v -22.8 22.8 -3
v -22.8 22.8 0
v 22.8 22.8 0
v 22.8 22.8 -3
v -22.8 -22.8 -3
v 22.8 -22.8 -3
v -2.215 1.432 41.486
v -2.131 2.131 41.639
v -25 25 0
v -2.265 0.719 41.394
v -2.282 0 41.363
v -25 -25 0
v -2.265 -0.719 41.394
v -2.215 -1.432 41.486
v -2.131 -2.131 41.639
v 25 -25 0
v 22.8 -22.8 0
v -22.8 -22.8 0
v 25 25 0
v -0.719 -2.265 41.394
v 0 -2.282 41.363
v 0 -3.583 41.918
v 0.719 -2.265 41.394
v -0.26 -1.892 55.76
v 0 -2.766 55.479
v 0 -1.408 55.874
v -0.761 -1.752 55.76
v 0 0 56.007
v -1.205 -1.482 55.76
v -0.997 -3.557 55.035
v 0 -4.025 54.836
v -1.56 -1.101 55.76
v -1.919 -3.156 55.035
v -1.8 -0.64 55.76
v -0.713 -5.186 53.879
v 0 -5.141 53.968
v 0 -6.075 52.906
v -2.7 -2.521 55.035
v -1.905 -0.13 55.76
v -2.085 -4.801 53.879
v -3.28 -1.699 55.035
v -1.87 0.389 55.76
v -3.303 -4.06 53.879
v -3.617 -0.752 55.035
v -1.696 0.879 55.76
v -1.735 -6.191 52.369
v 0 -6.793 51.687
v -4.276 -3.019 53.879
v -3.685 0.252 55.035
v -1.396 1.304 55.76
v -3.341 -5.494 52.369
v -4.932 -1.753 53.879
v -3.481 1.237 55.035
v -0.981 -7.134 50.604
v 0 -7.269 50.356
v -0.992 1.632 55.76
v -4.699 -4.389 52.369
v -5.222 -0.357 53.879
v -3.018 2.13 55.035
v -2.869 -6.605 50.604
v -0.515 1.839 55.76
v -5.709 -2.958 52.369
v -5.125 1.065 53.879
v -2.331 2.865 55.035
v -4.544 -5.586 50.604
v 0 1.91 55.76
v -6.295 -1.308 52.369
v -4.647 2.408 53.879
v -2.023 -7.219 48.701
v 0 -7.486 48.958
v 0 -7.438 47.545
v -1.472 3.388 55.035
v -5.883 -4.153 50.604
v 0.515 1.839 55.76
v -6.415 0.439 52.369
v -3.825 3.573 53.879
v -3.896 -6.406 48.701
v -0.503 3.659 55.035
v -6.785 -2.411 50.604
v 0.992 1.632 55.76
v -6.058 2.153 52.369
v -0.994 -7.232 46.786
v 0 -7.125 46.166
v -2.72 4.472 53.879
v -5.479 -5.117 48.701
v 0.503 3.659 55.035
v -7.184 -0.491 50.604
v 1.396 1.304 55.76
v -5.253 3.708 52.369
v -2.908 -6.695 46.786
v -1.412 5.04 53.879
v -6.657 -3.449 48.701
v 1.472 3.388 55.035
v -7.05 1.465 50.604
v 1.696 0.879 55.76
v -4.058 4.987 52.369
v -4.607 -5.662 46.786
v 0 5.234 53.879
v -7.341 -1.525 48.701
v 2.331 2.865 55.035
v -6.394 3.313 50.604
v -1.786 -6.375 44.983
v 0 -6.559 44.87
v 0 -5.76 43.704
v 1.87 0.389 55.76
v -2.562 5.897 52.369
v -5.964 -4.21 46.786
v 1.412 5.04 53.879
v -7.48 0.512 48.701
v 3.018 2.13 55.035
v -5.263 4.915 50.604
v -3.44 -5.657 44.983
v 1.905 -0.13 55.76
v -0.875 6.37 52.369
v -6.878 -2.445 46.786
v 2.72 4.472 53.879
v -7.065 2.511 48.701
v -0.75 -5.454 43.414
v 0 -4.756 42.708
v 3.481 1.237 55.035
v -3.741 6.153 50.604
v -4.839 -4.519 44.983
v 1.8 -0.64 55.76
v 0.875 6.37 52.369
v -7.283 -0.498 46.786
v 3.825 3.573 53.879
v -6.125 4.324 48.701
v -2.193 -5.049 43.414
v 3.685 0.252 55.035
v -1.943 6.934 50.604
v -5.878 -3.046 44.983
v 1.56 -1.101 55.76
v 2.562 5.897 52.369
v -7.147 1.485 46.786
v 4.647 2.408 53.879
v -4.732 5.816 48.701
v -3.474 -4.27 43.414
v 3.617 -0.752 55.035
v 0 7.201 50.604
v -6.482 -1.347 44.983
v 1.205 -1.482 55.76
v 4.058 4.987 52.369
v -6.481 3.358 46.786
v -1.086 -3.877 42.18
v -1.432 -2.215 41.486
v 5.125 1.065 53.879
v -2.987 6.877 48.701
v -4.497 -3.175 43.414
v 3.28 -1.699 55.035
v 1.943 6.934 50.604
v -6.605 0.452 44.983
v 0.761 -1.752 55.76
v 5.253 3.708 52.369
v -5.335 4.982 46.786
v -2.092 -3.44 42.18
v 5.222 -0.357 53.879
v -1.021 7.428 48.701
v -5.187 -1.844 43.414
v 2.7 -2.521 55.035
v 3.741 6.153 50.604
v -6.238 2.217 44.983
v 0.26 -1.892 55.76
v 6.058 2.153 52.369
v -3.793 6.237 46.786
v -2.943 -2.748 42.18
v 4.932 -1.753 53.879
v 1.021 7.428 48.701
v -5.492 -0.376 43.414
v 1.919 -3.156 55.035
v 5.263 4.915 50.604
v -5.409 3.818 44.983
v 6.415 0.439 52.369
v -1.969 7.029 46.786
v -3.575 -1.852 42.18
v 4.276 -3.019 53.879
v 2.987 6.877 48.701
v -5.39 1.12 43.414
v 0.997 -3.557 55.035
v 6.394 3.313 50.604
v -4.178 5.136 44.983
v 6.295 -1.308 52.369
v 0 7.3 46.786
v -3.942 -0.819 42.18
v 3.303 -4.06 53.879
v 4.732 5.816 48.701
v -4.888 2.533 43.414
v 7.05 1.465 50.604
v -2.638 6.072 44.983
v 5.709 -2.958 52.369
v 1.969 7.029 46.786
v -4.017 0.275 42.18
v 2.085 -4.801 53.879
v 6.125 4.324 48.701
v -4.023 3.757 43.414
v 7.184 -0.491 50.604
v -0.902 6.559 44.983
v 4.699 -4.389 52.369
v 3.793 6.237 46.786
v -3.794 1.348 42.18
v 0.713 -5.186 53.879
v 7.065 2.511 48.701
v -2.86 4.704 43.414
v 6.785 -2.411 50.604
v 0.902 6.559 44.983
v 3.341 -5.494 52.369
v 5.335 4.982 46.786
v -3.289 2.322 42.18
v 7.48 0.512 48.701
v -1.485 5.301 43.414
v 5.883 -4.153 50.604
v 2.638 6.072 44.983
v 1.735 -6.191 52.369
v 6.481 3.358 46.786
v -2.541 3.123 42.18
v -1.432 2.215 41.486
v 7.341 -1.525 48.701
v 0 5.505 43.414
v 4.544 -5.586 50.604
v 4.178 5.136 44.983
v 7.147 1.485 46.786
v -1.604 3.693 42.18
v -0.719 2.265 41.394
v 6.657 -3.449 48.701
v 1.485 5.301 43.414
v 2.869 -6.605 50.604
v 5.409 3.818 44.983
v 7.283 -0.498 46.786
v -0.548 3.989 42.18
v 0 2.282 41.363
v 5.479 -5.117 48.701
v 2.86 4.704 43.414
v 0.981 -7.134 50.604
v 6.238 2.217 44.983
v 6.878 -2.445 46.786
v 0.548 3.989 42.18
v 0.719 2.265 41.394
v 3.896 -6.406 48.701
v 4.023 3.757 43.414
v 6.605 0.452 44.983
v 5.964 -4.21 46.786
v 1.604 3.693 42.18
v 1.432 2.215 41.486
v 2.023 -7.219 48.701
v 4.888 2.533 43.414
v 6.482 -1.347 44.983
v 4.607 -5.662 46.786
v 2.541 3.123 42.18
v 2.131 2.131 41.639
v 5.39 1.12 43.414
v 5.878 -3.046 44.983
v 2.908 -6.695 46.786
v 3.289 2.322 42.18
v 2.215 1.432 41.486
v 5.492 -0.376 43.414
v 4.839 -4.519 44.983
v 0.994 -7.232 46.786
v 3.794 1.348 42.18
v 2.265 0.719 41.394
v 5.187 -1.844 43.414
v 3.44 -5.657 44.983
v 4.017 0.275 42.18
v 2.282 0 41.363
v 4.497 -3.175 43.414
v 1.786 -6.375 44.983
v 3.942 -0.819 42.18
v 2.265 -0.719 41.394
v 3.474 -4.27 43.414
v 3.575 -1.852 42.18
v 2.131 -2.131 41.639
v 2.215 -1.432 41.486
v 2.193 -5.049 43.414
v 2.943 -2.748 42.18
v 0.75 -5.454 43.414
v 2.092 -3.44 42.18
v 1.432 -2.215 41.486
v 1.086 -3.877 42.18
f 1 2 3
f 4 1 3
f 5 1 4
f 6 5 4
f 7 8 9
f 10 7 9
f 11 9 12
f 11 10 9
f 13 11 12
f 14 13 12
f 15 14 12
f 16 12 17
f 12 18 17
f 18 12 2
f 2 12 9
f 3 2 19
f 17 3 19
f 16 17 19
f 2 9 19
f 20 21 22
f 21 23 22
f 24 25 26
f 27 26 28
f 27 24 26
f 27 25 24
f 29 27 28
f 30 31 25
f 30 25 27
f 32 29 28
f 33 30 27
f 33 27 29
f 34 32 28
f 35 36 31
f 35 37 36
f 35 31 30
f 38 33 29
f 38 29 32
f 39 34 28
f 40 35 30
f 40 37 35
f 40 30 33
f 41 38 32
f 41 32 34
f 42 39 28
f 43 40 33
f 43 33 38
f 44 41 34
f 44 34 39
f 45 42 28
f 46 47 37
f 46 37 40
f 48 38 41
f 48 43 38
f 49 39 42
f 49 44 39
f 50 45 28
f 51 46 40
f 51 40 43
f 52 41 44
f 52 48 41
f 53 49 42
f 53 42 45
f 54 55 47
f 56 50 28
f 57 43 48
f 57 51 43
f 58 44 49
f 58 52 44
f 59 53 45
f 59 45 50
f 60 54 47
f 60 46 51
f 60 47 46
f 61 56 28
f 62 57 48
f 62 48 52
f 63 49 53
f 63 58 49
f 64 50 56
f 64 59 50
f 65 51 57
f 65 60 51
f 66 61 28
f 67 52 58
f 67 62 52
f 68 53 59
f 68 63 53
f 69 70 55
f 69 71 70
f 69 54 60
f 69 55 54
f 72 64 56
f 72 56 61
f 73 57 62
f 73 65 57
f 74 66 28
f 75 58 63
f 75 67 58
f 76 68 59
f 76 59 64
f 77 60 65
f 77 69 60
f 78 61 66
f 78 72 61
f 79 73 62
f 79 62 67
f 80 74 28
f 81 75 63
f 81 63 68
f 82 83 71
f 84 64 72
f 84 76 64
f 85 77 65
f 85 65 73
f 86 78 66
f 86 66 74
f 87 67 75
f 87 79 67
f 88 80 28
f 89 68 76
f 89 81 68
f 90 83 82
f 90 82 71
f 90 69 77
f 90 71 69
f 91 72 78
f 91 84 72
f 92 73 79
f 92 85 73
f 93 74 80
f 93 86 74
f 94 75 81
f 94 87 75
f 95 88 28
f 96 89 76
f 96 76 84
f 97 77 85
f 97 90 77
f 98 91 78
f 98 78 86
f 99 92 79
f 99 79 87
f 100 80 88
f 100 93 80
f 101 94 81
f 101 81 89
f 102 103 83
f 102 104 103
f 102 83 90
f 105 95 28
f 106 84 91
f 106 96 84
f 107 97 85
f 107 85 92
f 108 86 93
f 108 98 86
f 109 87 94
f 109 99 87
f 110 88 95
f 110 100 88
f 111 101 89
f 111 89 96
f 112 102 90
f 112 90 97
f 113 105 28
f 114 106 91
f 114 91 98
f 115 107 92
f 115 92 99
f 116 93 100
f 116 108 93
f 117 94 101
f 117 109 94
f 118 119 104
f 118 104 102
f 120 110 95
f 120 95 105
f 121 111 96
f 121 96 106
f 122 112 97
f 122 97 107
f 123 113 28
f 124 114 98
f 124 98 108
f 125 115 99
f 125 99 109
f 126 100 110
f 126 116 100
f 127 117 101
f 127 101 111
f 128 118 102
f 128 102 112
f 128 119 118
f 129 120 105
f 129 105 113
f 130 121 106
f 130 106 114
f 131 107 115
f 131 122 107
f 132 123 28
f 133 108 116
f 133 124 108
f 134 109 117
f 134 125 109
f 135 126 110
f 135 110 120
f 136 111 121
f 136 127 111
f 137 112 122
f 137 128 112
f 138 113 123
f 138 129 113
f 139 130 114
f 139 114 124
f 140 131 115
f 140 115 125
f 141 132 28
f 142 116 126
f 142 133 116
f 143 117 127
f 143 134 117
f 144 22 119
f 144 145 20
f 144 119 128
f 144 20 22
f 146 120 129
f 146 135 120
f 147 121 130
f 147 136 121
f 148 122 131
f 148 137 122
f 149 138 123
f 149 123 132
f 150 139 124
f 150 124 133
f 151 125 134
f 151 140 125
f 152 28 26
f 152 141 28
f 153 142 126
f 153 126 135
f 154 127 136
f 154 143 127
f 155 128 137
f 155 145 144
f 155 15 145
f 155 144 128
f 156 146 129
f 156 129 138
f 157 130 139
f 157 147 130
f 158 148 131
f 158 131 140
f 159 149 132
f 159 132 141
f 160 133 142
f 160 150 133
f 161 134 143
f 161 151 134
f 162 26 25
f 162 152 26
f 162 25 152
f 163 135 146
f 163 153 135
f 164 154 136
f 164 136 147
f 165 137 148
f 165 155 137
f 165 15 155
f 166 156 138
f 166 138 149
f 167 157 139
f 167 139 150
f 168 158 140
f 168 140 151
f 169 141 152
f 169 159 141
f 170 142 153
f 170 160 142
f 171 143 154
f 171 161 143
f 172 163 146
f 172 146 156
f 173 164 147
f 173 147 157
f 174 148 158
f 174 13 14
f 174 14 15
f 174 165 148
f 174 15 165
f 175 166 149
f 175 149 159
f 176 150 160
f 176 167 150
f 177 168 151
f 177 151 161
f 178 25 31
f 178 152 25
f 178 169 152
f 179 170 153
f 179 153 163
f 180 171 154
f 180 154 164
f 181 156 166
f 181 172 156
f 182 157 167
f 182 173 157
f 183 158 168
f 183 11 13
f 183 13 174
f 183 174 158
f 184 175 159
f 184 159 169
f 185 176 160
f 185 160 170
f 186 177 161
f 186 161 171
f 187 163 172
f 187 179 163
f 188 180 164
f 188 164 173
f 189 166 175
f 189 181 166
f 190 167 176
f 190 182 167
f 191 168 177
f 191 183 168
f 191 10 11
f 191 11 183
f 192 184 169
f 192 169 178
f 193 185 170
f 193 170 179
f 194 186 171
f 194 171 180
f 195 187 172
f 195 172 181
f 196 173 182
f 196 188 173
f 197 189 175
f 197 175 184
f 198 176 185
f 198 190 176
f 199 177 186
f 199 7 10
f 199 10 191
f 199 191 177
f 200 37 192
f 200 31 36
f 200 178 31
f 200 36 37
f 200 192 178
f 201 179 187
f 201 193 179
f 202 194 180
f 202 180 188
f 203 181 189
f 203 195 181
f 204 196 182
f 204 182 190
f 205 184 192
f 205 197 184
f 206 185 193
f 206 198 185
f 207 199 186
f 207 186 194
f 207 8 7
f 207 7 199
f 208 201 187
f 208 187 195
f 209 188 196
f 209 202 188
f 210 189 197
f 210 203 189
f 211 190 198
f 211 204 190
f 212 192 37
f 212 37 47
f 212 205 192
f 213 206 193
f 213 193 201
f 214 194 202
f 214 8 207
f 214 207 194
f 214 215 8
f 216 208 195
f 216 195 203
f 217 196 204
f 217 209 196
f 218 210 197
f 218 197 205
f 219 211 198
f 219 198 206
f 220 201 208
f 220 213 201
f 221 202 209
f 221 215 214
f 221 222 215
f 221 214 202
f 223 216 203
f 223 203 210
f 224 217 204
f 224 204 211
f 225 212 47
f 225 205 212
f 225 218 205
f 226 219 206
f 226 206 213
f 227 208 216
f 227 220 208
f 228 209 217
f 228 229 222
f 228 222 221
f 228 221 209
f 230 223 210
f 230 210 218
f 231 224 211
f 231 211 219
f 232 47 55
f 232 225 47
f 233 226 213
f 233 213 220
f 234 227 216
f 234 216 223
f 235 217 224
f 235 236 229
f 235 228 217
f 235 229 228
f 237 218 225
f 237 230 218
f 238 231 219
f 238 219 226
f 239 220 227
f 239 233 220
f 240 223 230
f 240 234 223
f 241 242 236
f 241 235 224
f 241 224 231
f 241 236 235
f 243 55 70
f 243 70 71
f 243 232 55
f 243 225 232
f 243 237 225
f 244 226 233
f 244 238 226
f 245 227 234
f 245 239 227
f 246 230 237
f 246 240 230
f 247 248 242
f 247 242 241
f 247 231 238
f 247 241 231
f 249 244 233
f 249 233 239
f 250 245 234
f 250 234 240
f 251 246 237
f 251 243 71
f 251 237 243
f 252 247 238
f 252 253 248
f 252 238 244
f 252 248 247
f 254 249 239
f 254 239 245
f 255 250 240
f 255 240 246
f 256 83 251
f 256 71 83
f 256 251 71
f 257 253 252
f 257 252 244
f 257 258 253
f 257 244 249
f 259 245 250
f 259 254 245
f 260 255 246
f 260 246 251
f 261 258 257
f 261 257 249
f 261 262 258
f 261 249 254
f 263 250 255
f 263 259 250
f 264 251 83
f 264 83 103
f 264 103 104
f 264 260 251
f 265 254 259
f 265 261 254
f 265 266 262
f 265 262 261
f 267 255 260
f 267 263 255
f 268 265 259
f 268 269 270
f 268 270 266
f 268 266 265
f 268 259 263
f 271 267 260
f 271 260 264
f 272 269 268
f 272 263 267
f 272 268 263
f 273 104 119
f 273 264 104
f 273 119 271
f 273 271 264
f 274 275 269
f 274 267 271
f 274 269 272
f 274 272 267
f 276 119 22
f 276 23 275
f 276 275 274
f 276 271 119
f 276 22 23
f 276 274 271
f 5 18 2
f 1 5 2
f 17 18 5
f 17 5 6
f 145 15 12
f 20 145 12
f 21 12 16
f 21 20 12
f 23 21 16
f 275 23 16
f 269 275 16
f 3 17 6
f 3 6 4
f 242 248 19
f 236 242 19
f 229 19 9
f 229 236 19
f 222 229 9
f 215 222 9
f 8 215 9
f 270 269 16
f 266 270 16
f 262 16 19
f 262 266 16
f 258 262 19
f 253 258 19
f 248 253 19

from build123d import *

# Parameters (mm, degrees)
F0_W     = 50
F0_H     = 50
F5_W     = 45.6
F5_H     = 45.6
F6_DEPTH = 3


with BuildPart() as f2:
    # F0 (on Top) → F2 section 0
    with BuildSketch(Plane.XY, mode=Mode.PRIVATE) as f2_s0:
        Rectangle(F0_W, F0_H)
    loft([f2_s0.sketch, Vertex(0, 0, 45.518458)])

    # F3 (on Right) → F4 (revolve)
    with BuildSketch(Plane.YZ):
        with BuildLine():
            Line((0, 41.007266), (0, 56.007266))
            ThreePointArc((0, 56.007266), (-7.5, 48.507266), (0, 41.007266))
        make_face()
    revolve(axis=Axis((0, 0, 48.507266), (0, 0, -1)))

    # F5 (on Top) → F6 (join)
    with BuildSketch(Plane.XY):
        Rectangle(F5_W, F5_H)
    extrude(amount=-F6_DEPTH)


solid = f2.part
